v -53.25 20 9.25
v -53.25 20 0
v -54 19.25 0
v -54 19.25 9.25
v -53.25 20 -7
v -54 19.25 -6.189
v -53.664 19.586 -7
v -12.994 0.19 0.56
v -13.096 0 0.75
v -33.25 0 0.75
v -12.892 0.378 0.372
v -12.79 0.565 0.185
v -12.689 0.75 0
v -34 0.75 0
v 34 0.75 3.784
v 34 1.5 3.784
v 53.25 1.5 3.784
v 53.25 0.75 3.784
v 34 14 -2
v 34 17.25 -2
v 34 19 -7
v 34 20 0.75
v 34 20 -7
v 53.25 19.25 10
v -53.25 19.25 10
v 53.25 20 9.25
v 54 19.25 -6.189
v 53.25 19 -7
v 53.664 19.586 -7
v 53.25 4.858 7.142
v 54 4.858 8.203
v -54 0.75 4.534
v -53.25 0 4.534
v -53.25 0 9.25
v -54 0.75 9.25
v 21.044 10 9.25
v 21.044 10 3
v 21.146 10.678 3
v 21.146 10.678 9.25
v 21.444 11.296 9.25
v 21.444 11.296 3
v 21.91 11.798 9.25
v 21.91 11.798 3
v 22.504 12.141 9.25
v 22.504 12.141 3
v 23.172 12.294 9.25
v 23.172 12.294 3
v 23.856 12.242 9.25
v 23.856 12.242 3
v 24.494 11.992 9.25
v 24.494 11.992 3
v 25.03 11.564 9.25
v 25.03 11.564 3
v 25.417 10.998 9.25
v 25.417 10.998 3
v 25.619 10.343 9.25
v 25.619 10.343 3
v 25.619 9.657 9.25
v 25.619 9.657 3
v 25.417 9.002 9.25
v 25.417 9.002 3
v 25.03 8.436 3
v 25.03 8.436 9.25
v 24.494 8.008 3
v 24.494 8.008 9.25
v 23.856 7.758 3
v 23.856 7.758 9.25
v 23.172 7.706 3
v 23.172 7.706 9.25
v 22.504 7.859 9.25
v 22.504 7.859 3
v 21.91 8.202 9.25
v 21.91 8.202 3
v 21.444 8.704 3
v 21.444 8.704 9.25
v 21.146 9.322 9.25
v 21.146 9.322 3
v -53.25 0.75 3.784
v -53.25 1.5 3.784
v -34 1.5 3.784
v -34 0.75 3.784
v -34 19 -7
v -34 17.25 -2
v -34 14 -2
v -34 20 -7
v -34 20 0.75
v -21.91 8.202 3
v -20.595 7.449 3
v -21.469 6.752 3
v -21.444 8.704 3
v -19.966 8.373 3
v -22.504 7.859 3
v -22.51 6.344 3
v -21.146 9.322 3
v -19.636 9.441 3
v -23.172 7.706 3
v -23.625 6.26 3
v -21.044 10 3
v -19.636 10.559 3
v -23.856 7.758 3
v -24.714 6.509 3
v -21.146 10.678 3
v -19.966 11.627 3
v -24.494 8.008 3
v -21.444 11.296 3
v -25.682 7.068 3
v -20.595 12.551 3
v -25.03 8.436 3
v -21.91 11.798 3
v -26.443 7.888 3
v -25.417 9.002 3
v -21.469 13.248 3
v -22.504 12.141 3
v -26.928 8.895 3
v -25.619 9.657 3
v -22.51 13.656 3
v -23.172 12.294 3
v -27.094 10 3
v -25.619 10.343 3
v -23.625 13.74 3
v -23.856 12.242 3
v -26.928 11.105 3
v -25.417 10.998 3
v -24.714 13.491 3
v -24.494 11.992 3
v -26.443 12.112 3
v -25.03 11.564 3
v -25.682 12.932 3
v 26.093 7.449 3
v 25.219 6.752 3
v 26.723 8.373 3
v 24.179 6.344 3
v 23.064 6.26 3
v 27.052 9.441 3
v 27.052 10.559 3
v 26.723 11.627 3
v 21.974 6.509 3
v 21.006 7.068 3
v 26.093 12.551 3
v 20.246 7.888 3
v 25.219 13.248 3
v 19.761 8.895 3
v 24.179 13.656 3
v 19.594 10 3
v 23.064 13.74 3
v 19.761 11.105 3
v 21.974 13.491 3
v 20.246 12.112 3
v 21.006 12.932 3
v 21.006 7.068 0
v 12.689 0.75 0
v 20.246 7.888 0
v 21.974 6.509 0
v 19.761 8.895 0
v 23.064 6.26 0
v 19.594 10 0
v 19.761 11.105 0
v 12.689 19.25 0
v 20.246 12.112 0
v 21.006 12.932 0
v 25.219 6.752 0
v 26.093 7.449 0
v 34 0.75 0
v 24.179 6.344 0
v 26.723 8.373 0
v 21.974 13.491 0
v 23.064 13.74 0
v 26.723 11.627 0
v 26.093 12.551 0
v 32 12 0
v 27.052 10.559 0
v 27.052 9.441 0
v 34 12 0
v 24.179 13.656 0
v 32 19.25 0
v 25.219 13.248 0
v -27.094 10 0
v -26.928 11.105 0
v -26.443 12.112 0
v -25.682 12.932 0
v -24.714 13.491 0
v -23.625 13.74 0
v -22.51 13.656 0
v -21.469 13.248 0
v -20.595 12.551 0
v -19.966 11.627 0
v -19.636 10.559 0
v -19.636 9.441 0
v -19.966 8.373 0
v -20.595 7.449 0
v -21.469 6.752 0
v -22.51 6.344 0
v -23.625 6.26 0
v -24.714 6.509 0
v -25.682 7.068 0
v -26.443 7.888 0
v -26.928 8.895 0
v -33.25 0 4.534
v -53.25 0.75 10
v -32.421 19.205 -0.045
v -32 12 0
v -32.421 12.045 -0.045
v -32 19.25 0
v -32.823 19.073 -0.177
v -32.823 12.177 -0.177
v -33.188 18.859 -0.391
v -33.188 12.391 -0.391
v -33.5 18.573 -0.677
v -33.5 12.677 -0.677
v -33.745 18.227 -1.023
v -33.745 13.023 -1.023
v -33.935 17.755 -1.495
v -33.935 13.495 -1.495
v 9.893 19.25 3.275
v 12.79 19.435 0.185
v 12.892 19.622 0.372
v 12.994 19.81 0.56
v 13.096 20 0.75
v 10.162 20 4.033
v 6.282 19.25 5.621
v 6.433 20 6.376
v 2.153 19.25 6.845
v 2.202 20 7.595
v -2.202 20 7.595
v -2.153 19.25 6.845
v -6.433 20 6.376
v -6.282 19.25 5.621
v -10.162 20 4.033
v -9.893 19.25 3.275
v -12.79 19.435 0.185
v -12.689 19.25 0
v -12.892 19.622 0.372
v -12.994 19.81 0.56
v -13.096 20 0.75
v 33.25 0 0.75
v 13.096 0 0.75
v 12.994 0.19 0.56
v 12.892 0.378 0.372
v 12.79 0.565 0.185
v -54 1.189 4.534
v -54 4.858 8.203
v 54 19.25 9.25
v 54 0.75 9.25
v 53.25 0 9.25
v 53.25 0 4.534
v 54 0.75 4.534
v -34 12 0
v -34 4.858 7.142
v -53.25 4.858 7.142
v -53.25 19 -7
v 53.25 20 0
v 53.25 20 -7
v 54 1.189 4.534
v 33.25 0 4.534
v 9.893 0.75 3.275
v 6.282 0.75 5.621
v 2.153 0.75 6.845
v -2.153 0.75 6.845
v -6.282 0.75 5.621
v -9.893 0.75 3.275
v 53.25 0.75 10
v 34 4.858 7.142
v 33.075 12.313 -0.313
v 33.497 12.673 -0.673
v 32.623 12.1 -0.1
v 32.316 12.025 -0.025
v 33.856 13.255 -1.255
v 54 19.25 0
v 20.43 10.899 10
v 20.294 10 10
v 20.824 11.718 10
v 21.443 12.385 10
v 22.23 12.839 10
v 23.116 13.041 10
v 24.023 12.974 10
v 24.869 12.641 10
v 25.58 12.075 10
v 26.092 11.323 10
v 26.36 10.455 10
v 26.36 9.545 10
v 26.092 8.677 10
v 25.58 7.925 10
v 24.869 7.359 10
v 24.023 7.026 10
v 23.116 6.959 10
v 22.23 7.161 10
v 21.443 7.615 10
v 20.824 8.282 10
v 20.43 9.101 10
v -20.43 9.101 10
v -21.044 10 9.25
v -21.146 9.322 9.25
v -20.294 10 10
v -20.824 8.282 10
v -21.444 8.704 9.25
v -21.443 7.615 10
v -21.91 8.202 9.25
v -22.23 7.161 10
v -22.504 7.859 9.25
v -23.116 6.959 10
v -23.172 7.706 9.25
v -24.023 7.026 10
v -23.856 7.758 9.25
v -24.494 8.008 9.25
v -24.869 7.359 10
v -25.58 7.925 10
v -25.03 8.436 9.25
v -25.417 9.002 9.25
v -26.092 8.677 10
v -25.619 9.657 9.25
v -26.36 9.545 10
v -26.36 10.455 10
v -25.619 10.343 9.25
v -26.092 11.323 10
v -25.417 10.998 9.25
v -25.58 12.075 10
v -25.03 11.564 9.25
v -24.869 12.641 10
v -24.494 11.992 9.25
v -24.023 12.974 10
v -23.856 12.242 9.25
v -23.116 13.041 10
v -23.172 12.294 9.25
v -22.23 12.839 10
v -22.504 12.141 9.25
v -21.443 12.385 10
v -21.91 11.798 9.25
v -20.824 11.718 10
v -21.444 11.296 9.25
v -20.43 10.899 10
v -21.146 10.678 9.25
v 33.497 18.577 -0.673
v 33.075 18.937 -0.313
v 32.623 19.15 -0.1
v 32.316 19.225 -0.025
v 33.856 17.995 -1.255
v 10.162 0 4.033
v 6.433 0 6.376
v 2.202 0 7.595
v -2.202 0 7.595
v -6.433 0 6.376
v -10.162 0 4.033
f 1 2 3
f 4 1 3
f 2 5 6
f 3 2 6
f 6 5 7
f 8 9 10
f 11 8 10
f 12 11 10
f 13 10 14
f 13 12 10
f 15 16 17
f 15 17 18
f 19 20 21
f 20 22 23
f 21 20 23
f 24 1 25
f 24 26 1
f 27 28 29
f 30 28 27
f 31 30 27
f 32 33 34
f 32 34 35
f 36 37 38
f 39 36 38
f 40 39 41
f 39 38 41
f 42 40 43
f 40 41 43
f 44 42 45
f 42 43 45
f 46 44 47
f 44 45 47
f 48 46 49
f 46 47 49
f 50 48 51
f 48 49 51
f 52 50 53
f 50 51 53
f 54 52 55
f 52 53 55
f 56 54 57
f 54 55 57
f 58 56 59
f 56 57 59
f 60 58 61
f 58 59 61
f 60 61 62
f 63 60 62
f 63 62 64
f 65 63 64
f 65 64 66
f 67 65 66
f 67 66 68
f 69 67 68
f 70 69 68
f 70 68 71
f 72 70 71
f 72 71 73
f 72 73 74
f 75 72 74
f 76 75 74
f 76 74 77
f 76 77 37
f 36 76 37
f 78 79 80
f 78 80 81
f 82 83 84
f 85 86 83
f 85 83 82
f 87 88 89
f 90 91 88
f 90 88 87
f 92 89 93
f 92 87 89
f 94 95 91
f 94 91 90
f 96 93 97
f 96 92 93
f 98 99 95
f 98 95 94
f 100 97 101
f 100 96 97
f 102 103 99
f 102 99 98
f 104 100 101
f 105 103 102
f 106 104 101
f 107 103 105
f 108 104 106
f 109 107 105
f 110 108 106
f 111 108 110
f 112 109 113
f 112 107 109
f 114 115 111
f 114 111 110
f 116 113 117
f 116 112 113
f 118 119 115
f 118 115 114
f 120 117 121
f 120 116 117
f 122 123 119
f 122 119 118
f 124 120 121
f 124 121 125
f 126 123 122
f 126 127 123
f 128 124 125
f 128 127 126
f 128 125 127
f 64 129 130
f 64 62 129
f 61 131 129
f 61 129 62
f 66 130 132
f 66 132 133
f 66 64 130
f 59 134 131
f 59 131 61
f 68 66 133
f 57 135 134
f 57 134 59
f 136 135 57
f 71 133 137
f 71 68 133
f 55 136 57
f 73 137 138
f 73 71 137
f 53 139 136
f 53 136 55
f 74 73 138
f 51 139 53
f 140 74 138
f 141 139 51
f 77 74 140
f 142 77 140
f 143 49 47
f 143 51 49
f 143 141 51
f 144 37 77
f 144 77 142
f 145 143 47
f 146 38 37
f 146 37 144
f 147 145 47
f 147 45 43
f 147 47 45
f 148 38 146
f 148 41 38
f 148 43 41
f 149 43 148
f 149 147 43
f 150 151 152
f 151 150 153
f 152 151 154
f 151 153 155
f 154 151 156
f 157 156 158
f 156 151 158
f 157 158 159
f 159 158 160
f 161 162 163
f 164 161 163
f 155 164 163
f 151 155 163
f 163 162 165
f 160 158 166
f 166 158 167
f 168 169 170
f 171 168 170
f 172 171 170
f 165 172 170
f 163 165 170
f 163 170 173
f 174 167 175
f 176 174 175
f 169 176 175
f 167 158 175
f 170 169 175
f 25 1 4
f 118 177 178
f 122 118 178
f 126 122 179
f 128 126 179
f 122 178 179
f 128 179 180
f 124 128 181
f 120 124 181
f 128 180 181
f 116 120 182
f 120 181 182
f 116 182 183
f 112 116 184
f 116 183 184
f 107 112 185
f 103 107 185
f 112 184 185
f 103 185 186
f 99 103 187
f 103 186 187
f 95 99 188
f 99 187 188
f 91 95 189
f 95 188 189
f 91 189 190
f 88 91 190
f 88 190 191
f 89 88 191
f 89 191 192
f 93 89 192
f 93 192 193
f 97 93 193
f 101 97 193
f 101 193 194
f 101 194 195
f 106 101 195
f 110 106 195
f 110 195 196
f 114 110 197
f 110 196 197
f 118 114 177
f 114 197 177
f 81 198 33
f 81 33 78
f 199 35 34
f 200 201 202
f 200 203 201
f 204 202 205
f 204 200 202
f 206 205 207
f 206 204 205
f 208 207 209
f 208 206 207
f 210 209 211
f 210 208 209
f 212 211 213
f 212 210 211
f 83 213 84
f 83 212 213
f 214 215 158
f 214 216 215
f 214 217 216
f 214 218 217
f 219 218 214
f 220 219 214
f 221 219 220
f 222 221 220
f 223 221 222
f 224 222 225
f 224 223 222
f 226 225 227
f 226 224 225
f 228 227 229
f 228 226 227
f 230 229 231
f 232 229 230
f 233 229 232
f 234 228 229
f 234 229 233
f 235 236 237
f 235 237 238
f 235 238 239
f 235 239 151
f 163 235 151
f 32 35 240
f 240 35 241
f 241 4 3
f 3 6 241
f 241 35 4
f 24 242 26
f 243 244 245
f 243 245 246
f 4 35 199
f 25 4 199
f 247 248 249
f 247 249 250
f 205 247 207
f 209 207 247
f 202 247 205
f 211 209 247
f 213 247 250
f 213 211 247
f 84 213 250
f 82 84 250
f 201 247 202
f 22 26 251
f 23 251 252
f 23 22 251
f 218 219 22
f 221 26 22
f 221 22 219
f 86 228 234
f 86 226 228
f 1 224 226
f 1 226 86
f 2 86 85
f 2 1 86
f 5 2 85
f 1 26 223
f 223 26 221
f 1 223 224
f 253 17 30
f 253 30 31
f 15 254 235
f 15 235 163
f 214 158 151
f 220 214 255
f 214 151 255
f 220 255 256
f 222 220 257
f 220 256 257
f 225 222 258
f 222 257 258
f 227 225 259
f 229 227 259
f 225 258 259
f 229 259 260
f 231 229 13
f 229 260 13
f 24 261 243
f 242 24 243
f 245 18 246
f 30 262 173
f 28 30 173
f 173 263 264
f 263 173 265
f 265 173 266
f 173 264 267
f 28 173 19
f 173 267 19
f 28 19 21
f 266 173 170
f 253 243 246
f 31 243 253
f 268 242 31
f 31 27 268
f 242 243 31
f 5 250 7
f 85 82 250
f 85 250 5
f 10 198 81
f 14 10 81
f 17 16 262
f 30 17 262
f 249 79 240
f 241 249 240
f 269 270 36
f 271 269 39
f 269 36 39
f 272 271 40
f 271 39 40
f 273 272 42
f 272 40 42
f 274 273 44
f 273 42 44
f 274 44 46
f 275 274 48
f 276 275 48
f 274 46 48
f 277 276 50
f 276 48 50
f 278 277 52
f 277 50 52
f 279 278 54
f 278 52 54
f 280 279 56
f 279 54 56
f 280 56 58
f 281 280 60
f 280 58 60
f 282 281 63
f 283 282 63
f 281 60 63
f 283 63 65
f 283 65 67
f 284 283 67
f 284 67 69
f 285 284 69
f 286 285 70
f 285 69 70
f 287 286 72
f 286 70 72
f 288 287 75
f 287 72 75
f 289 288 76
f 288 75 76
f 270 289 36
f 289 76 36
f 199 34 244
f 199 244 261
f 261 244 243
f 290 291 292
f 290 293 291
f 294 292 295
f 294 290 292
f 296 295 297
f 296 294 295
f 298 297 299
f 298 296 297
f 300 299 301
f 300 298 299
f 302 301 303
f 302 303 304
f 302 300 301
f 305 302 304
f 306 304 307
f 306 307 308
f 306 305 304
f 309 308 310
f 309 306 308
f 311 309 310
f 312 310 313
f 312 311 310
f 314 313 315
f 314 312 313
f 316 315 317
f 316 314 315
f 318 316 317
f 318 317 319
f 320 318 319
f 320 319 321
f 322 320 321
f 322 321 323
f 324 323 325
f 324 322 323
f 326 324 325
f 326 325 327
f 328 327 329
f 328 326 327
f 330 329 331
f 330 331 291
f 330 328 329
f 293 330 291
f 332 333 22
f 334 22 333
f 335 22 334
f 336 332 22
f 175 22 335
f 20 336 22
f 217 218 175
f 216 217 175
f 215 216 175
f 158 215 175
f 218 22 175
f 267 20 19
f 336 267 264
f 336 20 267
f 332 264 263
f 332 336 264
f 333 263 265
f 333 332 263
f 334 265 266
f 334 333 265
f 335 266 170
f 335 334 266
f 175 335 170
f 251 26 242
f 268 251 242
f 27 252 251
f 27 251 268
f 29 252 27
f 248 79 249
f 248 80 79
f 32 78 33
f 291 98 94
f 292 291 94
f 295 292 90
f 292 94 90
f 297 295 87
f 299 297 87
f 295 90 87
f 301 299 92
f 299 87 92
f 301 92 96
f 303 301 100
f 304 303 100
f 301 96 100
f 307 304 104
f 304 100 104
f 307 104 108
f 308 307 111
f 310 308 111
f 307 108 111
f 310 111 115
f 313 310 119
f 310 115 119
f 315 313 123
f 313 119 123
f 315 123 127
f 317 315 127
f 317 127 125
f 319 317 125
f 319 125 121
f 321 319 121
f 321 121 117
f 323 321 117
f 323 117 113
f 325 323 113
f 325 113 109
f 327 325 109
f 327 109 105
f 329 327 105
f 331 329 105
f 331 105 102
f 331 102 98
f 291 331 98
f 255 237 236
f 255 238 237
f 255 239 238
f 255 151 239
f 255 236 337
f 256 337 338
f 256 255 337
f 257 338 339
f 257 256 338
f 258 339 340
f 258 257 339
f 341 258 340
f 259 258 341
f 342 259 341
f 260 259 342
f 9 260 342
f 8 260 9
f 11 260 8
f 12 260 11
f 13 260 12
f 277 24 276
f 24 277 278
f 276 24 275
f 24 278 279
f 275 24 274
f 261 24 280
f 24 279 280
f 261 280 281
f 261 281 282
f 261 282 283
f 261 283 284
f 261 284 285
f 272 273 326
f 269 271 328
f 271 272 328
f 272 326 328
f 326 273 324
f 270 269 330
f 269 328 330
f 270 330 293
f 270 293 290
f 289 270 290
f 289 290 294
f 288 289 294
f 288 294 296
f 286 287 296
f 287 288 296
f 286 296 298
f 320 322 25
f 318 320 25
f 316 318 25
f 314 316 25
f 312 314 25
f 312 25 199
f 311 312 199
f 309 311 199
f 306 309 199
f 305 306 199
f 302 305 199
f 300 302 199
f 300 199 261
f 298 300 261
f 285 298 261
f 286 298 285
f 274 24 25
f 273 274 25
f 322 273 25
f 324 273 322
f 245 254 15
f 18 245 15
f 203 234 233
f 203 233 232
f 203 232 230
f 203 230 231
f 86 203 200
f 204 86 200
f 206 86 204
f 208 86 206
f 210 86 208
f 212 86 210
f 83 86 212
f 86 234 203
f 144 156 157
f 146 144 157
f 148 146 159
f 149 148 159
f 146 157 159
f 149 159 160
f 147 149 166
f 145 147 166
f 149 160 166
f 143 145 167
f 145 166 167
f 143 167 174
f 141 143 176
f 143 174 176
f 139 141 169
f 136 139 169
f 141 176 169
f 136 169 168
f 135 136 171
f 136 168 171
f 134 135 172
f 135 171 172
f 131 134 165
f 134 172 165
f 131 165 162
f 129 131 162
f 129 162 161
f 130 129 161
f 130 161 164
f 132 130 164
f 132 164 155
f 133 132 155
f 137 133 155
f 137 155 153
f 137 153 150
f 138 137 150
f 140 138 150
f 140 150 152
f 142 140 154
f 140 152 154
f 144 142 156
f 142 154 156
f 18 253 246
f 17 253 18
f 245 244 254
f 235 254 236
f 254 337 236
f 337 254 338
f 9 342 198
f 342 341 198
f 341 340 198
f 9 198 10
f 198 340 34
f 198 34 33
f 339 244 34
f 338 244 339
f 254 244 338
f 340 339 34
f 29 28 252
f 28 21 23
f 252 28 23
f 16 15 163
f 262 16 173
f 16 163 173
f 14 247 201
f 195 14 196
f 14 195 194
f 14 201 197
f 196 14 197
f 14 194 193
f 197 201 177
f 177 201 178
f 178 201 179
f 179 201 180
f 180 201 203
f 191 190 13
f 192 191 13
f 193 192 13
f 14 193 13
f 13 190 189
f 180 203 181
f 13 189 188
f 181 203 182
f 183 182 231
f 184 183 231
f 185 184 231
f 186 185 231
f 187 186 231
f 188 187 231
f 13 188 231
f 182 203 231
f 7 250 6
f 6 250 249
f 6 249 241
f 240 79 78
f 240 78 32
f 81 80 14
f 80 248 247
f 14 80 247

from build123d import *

# Parameters (mm, degrees)
SKIZZE1_W                       = 68
SKIZZE1_H                       = 20
AUFSATZ_LINEAR_AUSTRAGEN1_DEPTH = 10
AUFSATZ_LINEAR_AUSTRAGEN2_DEPTH = 20
SKIZZE3_R                       = 15
SCHNITT_LINEAR_AUSTRAGEN1_DEPTH = 20
SKIZZE4_R                       = 2.3
SCHNITT_LINEAR_AUSTRAGEN2_DEPTH = 10
SKIZZE5_R                       = 3.75
SCHNITT_LINEAR_AUSTRAGEN3_DEPTH = 3
SCHNITT_LINEAR_AUSTRAGEN4_DEPTH = 20
VERRUNDUNG1_R                   = 2


with BuildPart() as part:
    # Skizze1 → Aufsatz-Linear austragen1 (new body)
    with BuildSketch(Plane.XY):
        with Locations((0, 10)):
            Rectangle(SKIZZE1_W, SKIZZE1_H)
    extrude(amount=AUFSATZ_LINEAR_AUSTRAGEN1_DEPTH)

    # Skizze2 → Aufsatz-Linear austragen2 (add)
    with BuildSketch(Plane.ZY.offset(34)):
        Polygon((7.142135624, 4.857864376), (-7, 19), (-7, 20), (0, 20), (10, 20), (10, 0), (2.284271247, 0), align=None)
    aufsatz_linear_austragen2 = extrude(amount=AUFSATZ_LINEAR_AUSTRAGEN2_DEPTH)

    # Spiegeln1: Aufsatz-Linear austragen2 across plane
    add(aufsatz_linear_austragen2.mirror(Plane(origin=(0, 0, 0), x_dir=(0, 0, 1), z_dir=(1, 0, 0))))

    # Skizze3 → Schnitt-Linear austragen1 (cut)
    with BuildSketch(Plane.XZ):
        with Locations((0, -8)):
            Circle(SKIZZE3_R)
    extrude(amount=-SCHNITT_LINEAR_AUSTRAGEN1_DEPTH, mode=Mode.SUBTRACT)

    # Skizze4 → Schnitt-Linear austragen2 (cut)
    with BuildSketch(Plane(origin=(0, 0, 0), x_dir=(-1, 0, 0), z_dir=(0, 0, -1))):
        with Locations((-23.34428877, 10)):
            Circle(SKIZZE4_R)
        with Locations(Location((23.34428877, 10, 0), (0, 0, 180))):
            Circle(SKIZZE4_R)
    extrude(amount=-SCHNITT_LINEAR_AUSTRAGEN2_DEPTH, mode=Mode.SUBTRACT)

    # Skizze5 → Schnitt-Linear austragen3 (cut)
    with BuildSketch(Plane(origin=(0, 0, 0), x_dir=(-1, 0, 0), z_dir=(0, 0, -1))):
        with Locations((-23.34428877, 10)):
            Circle(SKIZZE5_R)
        with Locations((23.34428877, 10)):
            Circle(SKIZZE5_R)
    extrude(amount=-SCHNITT_LINEAR_AUSTRAGEN3_DEPTH, mode=Mode.SUBTRACT)

    # Skizze6 → Schnitt-Linear austragen4 (cut)
    with BuildSketch(Plane(origin=(54, 0, 0), x_dir=(0, 0, -1), z_dir=(1, 0, 0))):
        Polygon((-3.784271247, 1.5), (-3.784271247, 0), (-1.831080062, -0.949282867), (-1.396270995, 1.527811212), align=None)
    schnitt_linear_austragen4 = extrude(amount=-SCHNITT_LINEAR_AUSTRAGEN4_DEPTH, mode=Mode.SUBTRACT)

    # Spiegeln2: Schnitt-Linear austragen4 across plane
    add(schnitt_linear_austragen4.mirror(Plane(origin=(0, 0, 0), x_dir=(0, 0, 1), z_dir=(1, 0, 0))), mode=Mode.SUBTRACT)

    # Fase1
    # the kernel refuses this chamfer: 0.75 mm, written as the material it takes off along each edge
    with BuildSketch(Plane(origin=(53.5, 19.5, 9.5), x_dir=(-0.7071067811865476, 0.7071067811865476, 0), z_dir=(0.5773502691896257, 0.5773502691896257, 0.5773502691896257)), Plane(origin=(-53.5, 19.5, 9.5), x_dir=(-0.7071067811865476, -0.7071067811865476, 0), z_dir=(-0.5773502691896257, 0.5773502691896257, 0.5773502691896257))) as fase1_piece_1:
        Polygon((-0.530330086, -0.306186218), (0.530330086, -0.306186218), (0, 0.612372436), align=None)
    extrude(amount=0.952627944, mode=Mode.SUBTRACT)
    with BuildSketch(Plane(origin=(53.5, 0.5, 4.284271247), x_dir=(-0.7071067811865476, -1.2560739669470201e-15, -0.7071067811865476), z_dir=(0.5773502691896262, -0.577350269189626, -0.5773502691896252)), Plane(origin=(-53.5, 0.5, 9.5), x_dir=(-0.7071067811865476, 0.7071067811865474, 0), z_dir=(-0.5773502691896256, -0.5773502691896258, 0.5773502691896258)), Plane(origin=(-53.5, 0.5, 4.284271247), x_dir=(0, 0.707106781186547, -0.707106781186548), z_dir=(-0.577350269189626, -0.5773502691896262, -0.5773502691896253)), Plane(origin=(53.5, 0.5, 9.5), x_dir=(-0.7071067811865476, -0.7071067811865475, 0), z_dir=(0.5773502691896257, -0.5773502691896258, 0.5773502691896258))) as fase1_piece_2:
        Polygon((-0.530330086, 0.306186218), (0.530330086, 0.306186218), (0, -0.612372436), align=None)
    extrude(amount=0.952627944, mode=Mode.SUBTRACT)
    with BuildSketch(Plane(origin=(-23.34428877, 10, 10), x_dir=(1, 0, 0), z_dir=(0, 1, 0))) as fase1_piece_3:
        with BuildLine():
            Line((2.278786797, 0.771213203), (3.071213203, -0.021213203))
            Line((3.071213203, -0.021213203), (3.071213203, -0.036213203))
            ThreePointArc((3.071213203, -0.036213203), (2.685606602, -0.015), (2.3, -0.015))
            Line((2.3, -0.015), (2.285, 0))
            ThreePointArc((2.285, 0), (2.285, 0.385606602), (2.263786797, 0.771213203))
            Line((2.263786797, 0.771213203), (2.278786797, 0.771213203))
        make_face()
    revolve(axis=Axis((-23.34428877, 10, 10), (0, 0, -1)), mode=Mode.SUBTRACT)
    with BuildSketch(Plane(origin=(23.34428877, 10, 10), x_dir=(-1, 0, 0), z_dir=(0, -1, 0))) as fase1_piece_4:
        with BuildLine():
            Line((3.071213203, -0.021213203), (2.278786797, 0.771213203))
            Line((2.278786797, 0.771213203), (2.263786797, 0.771213203))
            ThreePointArc((2.263786797, 0.771213203), (2.285, 0.385606602), (2.285, 0))
            Line((2.285, 0), (2.3, -0.015))
            ThreePointArc((2.3, -0.015), (2.685606602, -0.015), (3.071213203, -0.036213203))
            Line((3.071213203, -0.036213203), (3.071213203, -0.021213203))
        make_face()
    revolve(axis=Axis((23.34428877, 10, 10), (0, 0, -1)), mode=Mode.SUBTRACT)
    with BuildSketch(Plane(origin=(54, 20, 0), x_dir=(-0.9996219169112968, 0.027495876610586893, 0), z_dir=(0, 0, 1))) as fase1_piece_5:
        with BuildLine():
            Line((0.771504896, 0), (-0.042410366, 0.770338345))
            Line((-0.042410366, 0.770338345), (-0.057404695, 0.769925907))
            ThreePointArc((-0.057404695, 0.769925907), (-0.02559692, 0.385048372), (-0.014994329, -0.000412438))
            Line((-0.014994329, -0.000412438), (0.000412438, -0.014994329))
            ThreePointArc((0.000412438, -0.014994329), (0.385873249, -0.004391737), (0.771917335, -0.014994329))
            Line((0.771917335, -0.014994329), (0.771504896, 0))
        make_face()
    extrude(amount=11.928762241, mode=Mode.SUBTRACT)
    with BuildSketch(Plane(origin=(54, 4.857864376, 7.142135624), x_dir=(-0.9996219169112968, -0.01944252080601377, -0.01944252080601398), z_dir=(0, 0.7071067811865513, -0.7071067811865438)), Plane(origin=(55.928762241, 0, 3.784271247), x_dir=(0, -0.027495876610586376, 0.9996219169112968), z_dir=(-1, 0, 0))) as fase1_piece_6:
        with BuildLine():
            Line((0.771504896, 0), (-0.042410366, 0.770338345))
            Line((-0.042410366, 0.770338345), (-0.057404695, 0.769925907))
            ThreePointArc((-0.057404695, 0.769925907), (-0.02559692, 0.385048372), (-0.014994329, -0.000412438))
            Line((-0.014994329, -0.000412438), (0.000412438, -0.014994329))
            ThreePointArc((0.000412438, -0.014994329), (0.385873249, -0.004391737), (0.771917335, -0.014994329))
            Line((0.771917335, -0.014994329), (0.771504896, 0))
        make_face()
    extrude(amount=21.928762241, mode=Mode.SUBTRACT)
    with BuildSketch(Plane(origin=(54, 0.13615914, 2.420430388), x_dir=(-0.9996219169112968, 0.01944252080601445, -0.019442520806014447), z_dir=(0, 0.7071067811865475, 0.7071067811865476))) as fase1_piece_7:
        with BuildLine():
            Line((0.771504896, 0), (-0.042410366, 0.770338345))
            Line((-0.042410366, 0.770338345), (-0.057404695, 0.769925907))
            ThreePointArc((-0.057404695, 0.769925907), (-0.02559692, 0.385048372), (-0.014994329, -0.000412438))
            Line((-0.014994329, -0.000412438), (0.000412438, -0.014994329))
            ThreePointArc((0.000412438, -0.014994329), (0.385873249, -0.004391737), (0.771917335, -0.014994329))
            Line((0.771917335, -0.014994329), (0.771504896, 0))
        make_face()
    extrude(amount=6.677499583, mode=Mode.SUBTRACT)
    with BuildSketch(Plane(origin=(54, 3.428762241, 3.784271247), x_dir=(0.027495876610582164, 0, 0.9996219169112969), z_dir=(0, -1, 0)), Plane(origin=(-54, 3.428762241, 3.784271247), x_dir=(0.9996219169112968, 0, -0.027495876610586317), z_dir=(0, -1, 0))) as fase1_piece_8:
        with BuildLine():
            Line((0.771504896, 0), (-0.042410366, 0.770338345))
            Line((-0.042410366, 0.770338345), (-0.057404695, 0.769925907))
            ThreePointArc((-0.057404695, 0.769925907), (-0.02559692, 0.385048372), (-0.014994329, -0.000412438))
            Line((-0.014994329, -0.000412438), (0.000412438, -0.014994329))
            ThreePointArc((0.000412438, -0.014994329), (0.385873249, -0.004391737), (0.771917335, -0.014994329))
            Line((0.771917335, -0.014994329), (0.771504896, 0))
        make_face()
    extrude(amount=5.357524482, mode=Mode.SUBTRACT)
    with BuildSketch(Plane(origin=(-54, 0, 11.928762241), x_dir=(0.9996219169112968, -0.027495876610586487, 0), z_dir=(0, 0, -1))) as fase1_piece_9:
        with BuildLine():
            Line((0.771504896, 0), (-0.042410366, -0.770338345))
            Line((-0.042410366, -0.770338345), (-0.057404695, -0.769925907))
            ThreePointArc((-0.057404695, -0.769925907), (-0.02559692, -0.385048372), (-0.014994329, 0.000412438))
            Line((-0.014994329, 0.000412438), (0.000412438, 0.014994329))
            ThreePointArc((0.000412438, 0.014994329), (0.385873249, 0.004391737), (0.771917335, 0.014994329))
            Line((0.771917335, 0.014994329), (0.771504896, 0))
        make_face()
    extrude(amount=10.073253234, mode=Mode.SUBTRACT)
    with BuildSketch(Plane(origin=(54, 21.928762241, 10), x_dir=(-0.9996219169112968, 0, 0.027495876610586893), z_dir=(0, -1, 0)), Plane(origin=(-54, 21.928762241, 10), x_dir=(-0.027495876610582164, 0, -0.9996219169112969), z_dir=(0, -1, 0))) as fase1_piece_10:
        with BuildLine():
            Line((0.771504896, 0), (-0.042410366, 0.770338345))
            Line((-0.042410366, 0.770338345), (-0.057404695, 0.769925907))
            ThreePointArc((-0.057404695, 0.769925907), (-0.02559692, 0.385048372), (-0.014994329, -0.000412438))
            Line((-0.014994329, -0.000412438), (0.000412438, -0.014994329))
            ThreePointArc((0.000412438, -0.014994329), (0.385873249, -0.004391737), (0.771917335, -0.014994329))
            Line((0.771917335, -0.014994329), (0.771504896, 0))
        make_face()
    extrude(amount=23.857524482, mode=Mode.SUBTRACT)
    with BuildSketch(Plane(origin=(55.928762241, 20, 10), x_dir=(0, 0.027495876610586768, -0.9996219169112968), z_dir=(-1, 0, 0))) as fase1_piece_11:
        with BuildLine():
            Line((0.771504896, 0), (-0.042410366, 0.770338345))
            Line((-0.042410366, 0.770338345), (-0.057404695, 0.769925907))
            ThreePointArc((-0.057404695, 0.769925907), (-0.02559692, 0.385048372), (-0.014994329, -0.000412438))
            Line((-0.014994329, -0.000412438), (0.000412438, -0.014994329))
            ThreePointArc((0.000412438, -0.014994329), (0.385873249, -0.004391737), (0.771917335, -0.014994329))
            Line((0.771917335, -0.014994329), (0.771504896, 0))
        make_face()
    extrude(amount=111.857524482, mode=Mode.SUBTRACT)
    with BuildSketch(Plane(origin=(55.928762241, 0, 10), x_dir=(0, -0.02749587661058636, -0.9996219169112968), z_dir=(-1, 0, 0))) as fase1_piece_12:
        with BuildLine():
            Line((0.771504896, 0), (-0.042410366, -0.770338345))
            Line((-0.042410366, -0.770338345), (-0.057404695, -0.769925907))
            ThreePointArc((-0.057404695, -0.769925907), (-0.02559692, -0.385048372), (-0.014994329, 0.000412438))
            Line((-0.014994329, 0.000412438), (0.000412438, 0.014994329))
            ThreePointArc((0.000412438, 0.014994329), (0.385873249, 0.004391737), (0.771917335, 0.014994329))
            Line((0.771917335, 0.014994329), (0.771504896, 0))
        make_face()
    extrude(amount=111.857524482, mode=Mode.SUBTRACT)
    with BuildSketch(Plane(origin=(54, 0, 11.928762241), x_dir=(-0.9996219169112968, -0.027495876610586487, 0), z_dir=(0, 0, -1))) as fase1_piece_13:
        with BuildLine():
            Line((0.771504896, 0), (-0.042410366, 0.770338345))
            Line((-0.042410366, 0.770338345), (-0.057404695, 0.769925907))
            ThreePointArc((-0.057404695, 0.769925907), (-0.02559692, 0.385048372), (-0.014994329, -0.000412438))
            Line((-0.014994329, -0.000412438), (0.000412438, -0.014994329))
            ThreePointArc((0.000412438, -0.014994329), (0.385873249, -0.004391737), (0.771917335, -0.014994329))
            Line((0.771917335, -0.014994329), (0.771504896, 0))
        make_face()
    extrude(amount=10.073253234, mode=Mode.SUBTRACT)
    with BuildSketch(Plane(origin=(34, 0, -1.928762241), x_dir=(-0.9996219169112968, -0.027495876610586487, 0), z_dir=(0, 0, 1)), Plane(origin=(-34, 0, 3.784271247), x_dir=(0.9996219169112968, -0.027495876610585248, 0), z_dir=(0, 0, -1))) as fase1_piece_14:
        with BuildLine():
            Line((0.771504896, 0), (-0.042410366, -0.770338345))
            Line((-0.042410366, -0.770338345), (-0.057404695, -0.769925907))
            ThreePointArc((-0.057404695, -0.769925907), (-0.02559692, -0.385048372), (-0.014994329, 0.000412438))
            Line((-0.014994329, 0.000412438), (0.000412438, 0.014994329))
            ThreePointArc((0.000412438, 0.014994329), (0.385873249, 0.004391737), (0.771917335, 0.014994329))
            Line((0.771917335, 0.014994329), (0.771504896, 0))
        make_face()
    extrude(amount=5.713033488, mode=Mode.SUBTRACT)
    with BuildSketch(Plane(origin=(35.928762241, 0, 0), x_dir=(0, -0.027495876610586372, 0.9996219169112968), z_dir=(-1, 0, 0)), Plane(origin=(-10.759815299, 0, 0), x_dir=(0, -0.027495876610586372, 0.9996219169112968), z_dir=(-1, 0, 0))) as fase1_piece_15:
        with BuildLine():
            Line((0.771504896, 0), (-0.042410366, 0.770338345))
            Line((-0.042410366, 0.770338345), (-0.057404695, 0.769925907))
            ThreePointArc((-0.057404695, 0.769925907), (-0.02559692, 0.385048372), (-0.014994329, -0.000412438))
            Line((-0.014994329, -0.000412438), (0.000412438, -0.014994329))
            ThreePointArc((0.000412438, -0.014994329), (0.385873249, -0.004391737), (0.771917335, -0.014994329))
            Line((0.771917335, -0.014994329), (0.771504896, 0))
        make_face()
    extrude(amount=25.168946941, mode=Mode.SUBTRACT)
    with BuildSketch(Plane(origin=(0, 0, -8), x_dir=(0.9073469377071577, 0, 0.42038260505573166), z_dir=(0.42038260505573166, 0, -0.9073469377071577))) as fase1_piece_16:
        with BuildLine():
            Line((15.771213203, 0.021213203), (14.978786797, -0.771213203))
            Line((14.978786797, -0.771213203), (14.963786797, -0.771213203))
            ThreePointArc((14.963786797, -0.771213203), (14.985, -0.385606602), (14.985, 0))
            Line((14.985, 0), (15, 0.015))
            ThreePointArc((15, 0.015), (15.385606602, 0.015), (15.771213203, 0.036213203))
            Line((15.771213203, 0.036213203), (15.771213203, 0.021213203))
        make_face()
    revolve(axis=Axis((0, 0, -8), (0, -1, 0)), revolution_arc=130.282509401, mode=Mode.SUBTRACT)
    with BuildSketch(Plane(origin=(-55.928762241, 0, 3.784271247), x_dir=(0, -0.027495876610586376, 0.9996219169112968), z_dir=(1, 0, 0)), Plane(origin=(-54, 4.857864376, 7.142135624), x_dir=(0.9996219169112968, -0.01944252080601377, -0.01944252080601398), z_dir=(0, 0.7071067811865513, -0.7071067811865438))) as fase1_piece_17:
        with BuildLine():
            Line((0.771504896, 0), (-0.042410366, -0.770338345))
            Line((-0.042410366, -0.770338345), (-0.057404695, -0.769925907))
            ThreePointArc((-0.057404695, -0.769925907), (-0.02559692, -0.385048372), (-0.014994329, 0.000412438))
            Line((-0.014994329, 0.000412438), (0.000412438, 0.014994329))
            ThreePointArc((0.000412438, 0.014994329), (0.385873249, 0.004391737), (0.771917335, 0.014994329))
            Line((0.771917335, 0.014994329), (0.771504896, 0))
        make_face()
    extrude(amount=21.928762241, mode=Mode.SUBTRACT)
    with BuildSketch(Plane(origin=(-54, 0.13615914, 2.420430388), x_dir=(0.9996219169112968, 0.01944252080601436, -0.019442520806014357), z_dir=(0, 0.7071067811865475, 0.7071067811865476))) as fase1_piece_18:
        with BuildLine():
            Line((0.771504896, 0), (-0.042410366, -0.770338345))
            Line((-0.042410366, -0.770338345), (-0.057404695, -0.769925907))
            ThreePointArc((-0.057404695, -0.769925907), (-0.02559692, -0.385048372), (-0.014994329, 0.000412438))
            Line((-0.014994329, 0.000412438), (0.000412438, 0.014994329))
            ThreePointArc((0.000412438, 0.014994329), (0.385873249, 0.004391737), (0.771917335, 0.014994329))
            Line((0.771917335, 0.014994329), (0.771504896, 0))
        make_face()
    extrude(amount=6.677499583, mode=Mode.SUBTRACT)
    with BuildSketch(Plane(origin=(-34, 20, 0), x_dir=(0, 0.027495876610586778, 0.9996219169112968), z_dir=(1, 0, 0)), Plane(origin=(10.759815299, 20, 0), x_dir=(0, 0.027495876610586778, 0.9996219169112968), z_dir=(1, 0, 0))) as fase1_piece_19:
        with BuildLine():
            Line((0.771504896, 0), (-0.042410366, 0.770338345))
            Line((-0.042410366, 0.770338345), (-0.057404695, 0.769925907))
            ThreePointArc((-0.057404695, 0.769925907), (-0.02559692, 0.385048372), (-0.014994329, -0.000412438))
            Line((-0.014994329, -0.000412438), (0.000412438, -0.014994329))
            ThreePointArc((0.000412438, -0.014994329), (0.385873249, -0.004391737), (0.771917335, -0.014994329))
            Line((0.771917335, -0.014994329), (0.771504896, 0))
        make_face()
    extrude(amount=23.240184701, mode=Mode.SUBTRACT)
    with BuildSketch(Plane(origin=(0, 20, -8), x_dir=(0.9073469377071578, 0, 0.42038260505573166), z_dir=(0.42038260505573166, 0, -0.9073469377071578))) as fase1_piece_20:
        with BuildLine():
            Line((14.978786797, 0.771213203), (15.771213203, -0.021213203))
            Line((15.771213203, -0.021213203), (15.771213203, -0.036213203))
            ThreePointArc((15.771213203, -0.036213203), (15.385606602, -0.015), (15, -0.015))
            Line((15, -0.015), (14.985, 0))
            ThreePointArc((14.985, 0), (14.985, 0.385606602), (14.963786797, 0.771213203))
            Line((14.963786797, 0.771213203), (14.978786797, 0.771213203))
        make_face()
    revolve(axis=Axis((0, 20, -8), (0, -1, 0)), revolution_arc=130.282509401, mode=Mode.SUBTRACT)
    with BuildSketch(Plane(origin=(-54, 20, 0), x_dir=(0.9996219169112968, 0.027495876610586893, 0), z_dir=(0, 0, 1))) as fase1_piece_21:
        with BuildLine():
            Line((0.771504896, 0), (-0.042410366, -0.770338345))
            Line((-0.042410366, -0.770338345), (-0.057404695, -0.769925907))
            ThreePointArc((-0.057404695, -0.769925907), (-0.02559692, -0.385048372), (-0.014994329, 0.000412438))
            Line((-0.014994329, 0.000412438), (0.000412438, 0.014994329))
            ThreePointArc((0.000412438, 0.014994329), (0.385873249, 0.004391737), (0.771917335, 0.014994329))
            Line((0.771917335, 0.014994329), (0.771504896, 0))
        make_face()
    extrude(amount=11.928762241, mode=Mode.SUBTRACT)
    with BuildSketch(Plane(origin=(-54, 20, -8.928762241), x_dir=(0.9996219169112968, 0.027495876610586893, -2.912407812628222e-14), z_dir=(0, 1.059216206806384e-12, 1.0))) as fase1_piece_22:
        with BuildLine():
            Line((0.771504896, 0), (-0.042410366, -0.770338345))
            Line((-0.042410366, -0.770338345), (-0.057404695, -0.769925907))
            ThreePointArc((-0.057404695, -0.769925907), (-0.02559692, -0.385048372), (-0.014994329, 0.000412438))
            Line((-0.014994329, 0.000412438), (0.000412438, 0.014994329))
            ThreePointArc((0.000412438, 0.014994329), (0.385873249, 0.004391737), (0.771917335, 0.014994329))
            Line((0.771917335, 0.014994329), (0.771504896, 0))
        make_face()
    extrude(amount=8.928762241, mode=Mode.SUBTRACT)
    with BuildSketch(Plane(origin=(54, 20, -8.928762241), x_dir=(-0.9996219169112968, 0.027495876610586893, -2.912407812628222e-14), z_dir=(0, 1.059216206806384e-12, 1.0))) as fase1_piece_23:
        with BuildLine():
            Line((0.771504896, 0), (-0.042410366, 0.770338345))
            Line((-0.042410366, 0.770338345), (-0.057404695, 0.769925907))
            ThreePointArc((-0.057404695, 0.769925907), (-0.02559692, 0.385048372), (-0.014994329, -0.000412438))
            Line((-0.014994329, -0.000412438), (0.000412438, -0.014994329))
            ThreePointArc((0.000412438, -0.014994329), (0.385873249, -0.004391737), (0.771917335, -0.014994329))
            Line((0.771917335, -0.014994329), (0.771504896, 0))
        make_face()
    extrude(amount=8.928762241, mode=Mode.SUBTRACT)
    with BuildSketch(Plane(origin=(54, 3.494023516, 8.505976484), x_dir=(-0.9996219169112968, -0.01944252080601521, -0.019442520806015415), z_dir=(0, 0.7071067811865513, -0.7071067811865438))) as fase1_piece_24a_section:
        with BuildLine():
            Line((0.771504896, 0), (-0.042410366, 0.770338345))
            Line((-0.042410366, 0.770338345), (-0.057404695, 0.769925907))
            ThreePointArc((-0.057404695, 0.769925907), (-0.02559692, 0.385048372), (-0.014994329, -0.000412438))
            Line((-0.014994329, -0.000412438), (0.000412438, -0.014994329))
            ThreePointArc((0.000412438, -0.014994329), (0.385873249, -0.004391737), (0.771917335, -0.014994329))
            Line((0.771917335, -0.014994329), (0.771504896, 0))
        make_face()
    fase1_piece_24a = extrude(amount=23.857524482, mode=Mode.PRIVATE)
    fase1_piece_24a = split(fase1_piece_24a, bisect_by=Plane(origin=(53.75265478, 5.032763859, 7.317035106), z_dir=(0, -0.7071067811865476, 0.7071067811865475)), keep=Keep.TOP, mode=Mode.PRIVATE)
    with BuildSketch(Plane(origin=(54, 0.13615914, 2.420430388), x_dir=(-0.9996219169112968, 0.01944252080601445, -0.019442520806014447), z_dir=(0, 0.7071067811865475, 0.7071067811865476))) as fase1_piece_24b_section:
        with BuildLine():
            Line((0.771504896, 0), (-0.042410366, 0.770338345))
            Line((-0.042410366, 0.770338345), (-0.057404695, 0.769925907))
            ThreePointArc((-0.057404695, 0.769925907), (-0.02559692, 0.385048372), (-0.014994329, -0.000412438))
            Line((-0.014994329, -0.000412438), (0.000412438, -0.014994329))
            ThreePointArc((0.000412438, -0.014994329), (0.385873249, -0.004391737), (0.771917335, -0.014994329))
            Line((0.771917335, -0.014994329), (0.771504896, 0))
        make_face()
    fase1_piece_24b = extrude(amount=8.606261823, mode=Mode.PRIVATE)
    fase1_piece_24b = split(fase1_piece_24b, bisect_by=Plane(origin=(53.75265478, 4.682964894, 7.317035106), z_dir=(0, 0.7071067811865438, 0.7071067811865513)), keep=Keep.TOP, mode=Mode.PRIVATE)
    fase1_piece_24 = fase1_piece_24a & fase1_piece_24b
    add(fase1_piece_24, mode=Mode.SUBTRACT)
    with BuildSketch(Plane(origin=(34, 0, -1.928762241), x_dir=(-0.9996219169112968, -0.027495876610586487, 0), z_dir=(0, 0, 1))) as fase1_piece_25a_section:
        with BuildLine():
            Line((0.771504896, 0), (-0.042410366, -0.770338345))
            Line((-0.042410366, -0.770338345), (-0.057404695, -0.769925907))
            ThreePointArc((-0.057404695, -0.769925907), (-0.02559692, -0.385048372), (-0.014994329, 0.000412438))
            Line((-0.014994329, 0.000412438), (0.000412438, 0.014994329))
            ThreePointArc((0.000412438, 0.014994329), (0.385873249, 0.004391737), (0.771917335, 0.014994329))
            Line((0.771917335, 0.014994329), (0.771504896, 0))
        make_face()
    fase1_piece_25a = extrude(amount=7.641795729, mode=Mode.PRIVATE)
    fase1_piece_25a = split(fase1_piece_25a, bisect_by=Plane(origin=(33.75265478, 0.24734522, 3.784271247), z_dir=(0, 0, 1)), keep=Keep.TOP, mode=Mode.PRIVATE)
    with BuildSketch(Plane(origin=(55.928762241, 0, 3.784271247), x_dir=(0, -0.027495876610586376, 0.9996219169112968), z_dir=(-1, 0, 0))) as fase1_piece_25b_section:
        with BuildLine():
            Line((0.771504896, 0), (-0.042410366, 0.770338345))
            Line((-0.042410366, 0.770338345), (-0.057404695, 0.769925907))
            ThreePointArc((-0.057404695, 0.769925907), (-0.02559692, 0.385048372), (-0.014994329, -0.000412438))
            Line((-0.014994329, -0.000412438), (0.000412438, -0.014994329))
            ThreePointArc((0.000412438, -0.014994329), (0.385873249, -0.004391737), (0.771917335, -0.014994329))
            Line((0.771917335, -0.014994329), (0.771504896, 0))
        make_face()
    fase1_piece_25b = extrude(amount=23.857524482, mode=Mode.PRIVATE)
    fase1_piece_25b = split(fase1_piece_25b, bisect_by=Plane(origin=(34, 0.24734522, 4.031616468), z_dir=(-1, 0, 0)), keep=Keep.TOP, mode=Mode.PRIVATE)
    fase1_piece_25 = fase1_piece_25a & fase1_piece_25b
    add(fase1_piece_25, mode=Mode.SUBTRACT)
    with BuildSketch(Plane(origin=(-55.928762241, 0, 3.784271247), x_dir=(0, -0.027495876610586376, 0.9996219169112968), z_dir=(1, 0, 0))) as fase1_piece_26a_section:
        with BuildLine():
            Line((0.771504896, 0), (-0.042410366, -0.770338345))
            Line((-0.042410366, -0.770338345), (-0.057404695, -0.769925907))
            ThreePointArc((-0.057404695, -0.769925907), (-0.02559692, -0.385048372), (-0.014994329, 0.000412438))
            Line((-0.014994329, 0.000412438), (0.000412438, 0.014994329))
            ThreePointArc((0.000412438, 0.014994329), (0.385873249, 0.004391737), (0.771917335, 0.014994329))
            Line((0.771917335, 0.014994329), (0.771504896, 0))
        make_face()
    fase1_piece_26a = extrude(amount=23.857524482, mode=Mode.PRIVATE)
    fase1_piece_26a = split(fase1_piece_26a, bisect_by=Plane(origin=(-34, 0.24734522, 4.031616468), z_dir=(1, 0, 0)), keep=Keep.TOP, mode=Mode.PRIVATE)
    with BuildSketch(Plane(origin=(-34, 0, 5.713033488), x_dir=(0.9996219169112968, -0.027495876610586487, 0), z_dir=(0, 0, -1))) as fase1_piece_26b_section:
        with BuildLine():
            Line((0.771504896, 0), (-0.042410366, -0.770338345))
            Line((-0.042410366, -0.770338345), (-0.057404695, -0.769925907))
            ThreePointArc((-0.057404695, -0.769925907), (-0.02559692, -0.385048372), (-0.014994329, 0.000412438))
            Line((-0.014994329, 0.000412438), (0.000412438, 0.014994329))
            ThreePointArc((0.000412438, 0.014994329), (0.385873249, 0.004391737), (0.771917335, 0.014994329))
            Line((0.771917335, 0.014994329), (0.771504896, 0))
        make_face()
    fase1_piece_26b = extrude(amount=7.641795729, mode=Mode.PRIVATE)
    fase1_piece_26b = split(fase1_piece_26b, bisect_by=Plane(origin=(-33.75265478, 0.24734522, 3.784271247), z_dir=(0, 0, 1)), keep=Keep.TOP, mode=Mode.PRIVATE)
    fase1_piece_26 = fase1_piece_26a & fase1_piece_26b
    add(fase1_piece_26, mode=Mode.SUBTRACT)
    with BuildSketch(Plane(origin=(-54, 3.494023516, 8.505976484), x_dir=(0.9996219169112968, -0.019442520806014923, -0.019442520806015127), z_dir=(0, 0.7071067811865513, -0.7071067811865438))) as fase1_piece_27a_section:
        with BuildLine():
            Line((0.771504896, 0), (-0.042410366, -0.770338345))
            Line((-0.042410366, -0.770338345), (-0.057404695, -0.769925907))
            ThreePointArc((-0.057404695, -0.769925907), (-0.02559692, -0.385048372), (-0.014994329, 0.000412438))
            Line((-0.014994329, 0.000412438), (0.000412438, 0.014994329))
            ThreePointArc((0.000412438, 0.014994329), (0.385873249, 0.004391737), (0.771917335, 0.014994329))
            Line((0.771917335, 0.014994329), (0.771504896, 0))
        make_face()
    fase1_piece_27a = extrude(amount=23.857524482, mode=Mode.PRIVATE)
    fase1_piece_27a = split(fase1_piece_27a, bisect_by=Plane(origin=(-53.75265478, 5.032763859, 7.317035106), z_dir=(0, -0.7071067811865476, 0.7071067811865475)), keep=Keep.TOP, mode=Mode.PRIVATE)
    with BuildSketch(Plane(origin=(-54, 0.13615914, 2.420430388), x_dir=(0.9996219169112968, 0.01944252080601436, -0.019442520806014357), z_dir=(0, 0.7071067811865475, 0.7071067811865476))) as fase1_piece_27b_section:
        with BuildLine():
            Line((0.771504896, 0), (-0.042410366, -0.770338345))
            Line((-0.042410366, -0.770338345), (-0.057404695, -0.769925907))
            ThreePointArc((-0.057404695, -0.769925907), (-0.02559692, -0.385048372), (-0.014994329, 0.000412438))
            Line((-0.014994329, 0.000412438), (0.000412438, 0.014994329))
            ThreePointArc((0.000412438, 0.014994329), (0.385873249, 0.004391737), (0.771917335, 0.014994329))
            Line((0.771917335, 0.014994329), (0.771504896, 0))
        make_face()
    fase1_piece_27b = extrude(amount=8.606261823, mode=Mode.PRIVATE)
    fase1_piece_27b = split(fase1_piece_27b, bisect_by=Plane(origin=(-53.75265478, 4.682964894, 7.317035106), z_dir=(0, 0.7071067811865438, 0.7071067811865513)), keep=Keep.TOP, mode=Mode.PRIVATE)
    fase1_piece_27 = fase1_piece_27a & fase1_piece_27b
    add(fase1_piece_27, mode=Mode.SUBTRACT)

    # Verrundung1
    verrundung1_edges = [part.edges().sort_by_distance(p)[0] for p in [
        (-34, 15.625, 0),
        (34, 15.625, 0),
    ]]
    fillet(verrundung1_edges, radius=VERRUNDUNG1_R)


solid = part.part
